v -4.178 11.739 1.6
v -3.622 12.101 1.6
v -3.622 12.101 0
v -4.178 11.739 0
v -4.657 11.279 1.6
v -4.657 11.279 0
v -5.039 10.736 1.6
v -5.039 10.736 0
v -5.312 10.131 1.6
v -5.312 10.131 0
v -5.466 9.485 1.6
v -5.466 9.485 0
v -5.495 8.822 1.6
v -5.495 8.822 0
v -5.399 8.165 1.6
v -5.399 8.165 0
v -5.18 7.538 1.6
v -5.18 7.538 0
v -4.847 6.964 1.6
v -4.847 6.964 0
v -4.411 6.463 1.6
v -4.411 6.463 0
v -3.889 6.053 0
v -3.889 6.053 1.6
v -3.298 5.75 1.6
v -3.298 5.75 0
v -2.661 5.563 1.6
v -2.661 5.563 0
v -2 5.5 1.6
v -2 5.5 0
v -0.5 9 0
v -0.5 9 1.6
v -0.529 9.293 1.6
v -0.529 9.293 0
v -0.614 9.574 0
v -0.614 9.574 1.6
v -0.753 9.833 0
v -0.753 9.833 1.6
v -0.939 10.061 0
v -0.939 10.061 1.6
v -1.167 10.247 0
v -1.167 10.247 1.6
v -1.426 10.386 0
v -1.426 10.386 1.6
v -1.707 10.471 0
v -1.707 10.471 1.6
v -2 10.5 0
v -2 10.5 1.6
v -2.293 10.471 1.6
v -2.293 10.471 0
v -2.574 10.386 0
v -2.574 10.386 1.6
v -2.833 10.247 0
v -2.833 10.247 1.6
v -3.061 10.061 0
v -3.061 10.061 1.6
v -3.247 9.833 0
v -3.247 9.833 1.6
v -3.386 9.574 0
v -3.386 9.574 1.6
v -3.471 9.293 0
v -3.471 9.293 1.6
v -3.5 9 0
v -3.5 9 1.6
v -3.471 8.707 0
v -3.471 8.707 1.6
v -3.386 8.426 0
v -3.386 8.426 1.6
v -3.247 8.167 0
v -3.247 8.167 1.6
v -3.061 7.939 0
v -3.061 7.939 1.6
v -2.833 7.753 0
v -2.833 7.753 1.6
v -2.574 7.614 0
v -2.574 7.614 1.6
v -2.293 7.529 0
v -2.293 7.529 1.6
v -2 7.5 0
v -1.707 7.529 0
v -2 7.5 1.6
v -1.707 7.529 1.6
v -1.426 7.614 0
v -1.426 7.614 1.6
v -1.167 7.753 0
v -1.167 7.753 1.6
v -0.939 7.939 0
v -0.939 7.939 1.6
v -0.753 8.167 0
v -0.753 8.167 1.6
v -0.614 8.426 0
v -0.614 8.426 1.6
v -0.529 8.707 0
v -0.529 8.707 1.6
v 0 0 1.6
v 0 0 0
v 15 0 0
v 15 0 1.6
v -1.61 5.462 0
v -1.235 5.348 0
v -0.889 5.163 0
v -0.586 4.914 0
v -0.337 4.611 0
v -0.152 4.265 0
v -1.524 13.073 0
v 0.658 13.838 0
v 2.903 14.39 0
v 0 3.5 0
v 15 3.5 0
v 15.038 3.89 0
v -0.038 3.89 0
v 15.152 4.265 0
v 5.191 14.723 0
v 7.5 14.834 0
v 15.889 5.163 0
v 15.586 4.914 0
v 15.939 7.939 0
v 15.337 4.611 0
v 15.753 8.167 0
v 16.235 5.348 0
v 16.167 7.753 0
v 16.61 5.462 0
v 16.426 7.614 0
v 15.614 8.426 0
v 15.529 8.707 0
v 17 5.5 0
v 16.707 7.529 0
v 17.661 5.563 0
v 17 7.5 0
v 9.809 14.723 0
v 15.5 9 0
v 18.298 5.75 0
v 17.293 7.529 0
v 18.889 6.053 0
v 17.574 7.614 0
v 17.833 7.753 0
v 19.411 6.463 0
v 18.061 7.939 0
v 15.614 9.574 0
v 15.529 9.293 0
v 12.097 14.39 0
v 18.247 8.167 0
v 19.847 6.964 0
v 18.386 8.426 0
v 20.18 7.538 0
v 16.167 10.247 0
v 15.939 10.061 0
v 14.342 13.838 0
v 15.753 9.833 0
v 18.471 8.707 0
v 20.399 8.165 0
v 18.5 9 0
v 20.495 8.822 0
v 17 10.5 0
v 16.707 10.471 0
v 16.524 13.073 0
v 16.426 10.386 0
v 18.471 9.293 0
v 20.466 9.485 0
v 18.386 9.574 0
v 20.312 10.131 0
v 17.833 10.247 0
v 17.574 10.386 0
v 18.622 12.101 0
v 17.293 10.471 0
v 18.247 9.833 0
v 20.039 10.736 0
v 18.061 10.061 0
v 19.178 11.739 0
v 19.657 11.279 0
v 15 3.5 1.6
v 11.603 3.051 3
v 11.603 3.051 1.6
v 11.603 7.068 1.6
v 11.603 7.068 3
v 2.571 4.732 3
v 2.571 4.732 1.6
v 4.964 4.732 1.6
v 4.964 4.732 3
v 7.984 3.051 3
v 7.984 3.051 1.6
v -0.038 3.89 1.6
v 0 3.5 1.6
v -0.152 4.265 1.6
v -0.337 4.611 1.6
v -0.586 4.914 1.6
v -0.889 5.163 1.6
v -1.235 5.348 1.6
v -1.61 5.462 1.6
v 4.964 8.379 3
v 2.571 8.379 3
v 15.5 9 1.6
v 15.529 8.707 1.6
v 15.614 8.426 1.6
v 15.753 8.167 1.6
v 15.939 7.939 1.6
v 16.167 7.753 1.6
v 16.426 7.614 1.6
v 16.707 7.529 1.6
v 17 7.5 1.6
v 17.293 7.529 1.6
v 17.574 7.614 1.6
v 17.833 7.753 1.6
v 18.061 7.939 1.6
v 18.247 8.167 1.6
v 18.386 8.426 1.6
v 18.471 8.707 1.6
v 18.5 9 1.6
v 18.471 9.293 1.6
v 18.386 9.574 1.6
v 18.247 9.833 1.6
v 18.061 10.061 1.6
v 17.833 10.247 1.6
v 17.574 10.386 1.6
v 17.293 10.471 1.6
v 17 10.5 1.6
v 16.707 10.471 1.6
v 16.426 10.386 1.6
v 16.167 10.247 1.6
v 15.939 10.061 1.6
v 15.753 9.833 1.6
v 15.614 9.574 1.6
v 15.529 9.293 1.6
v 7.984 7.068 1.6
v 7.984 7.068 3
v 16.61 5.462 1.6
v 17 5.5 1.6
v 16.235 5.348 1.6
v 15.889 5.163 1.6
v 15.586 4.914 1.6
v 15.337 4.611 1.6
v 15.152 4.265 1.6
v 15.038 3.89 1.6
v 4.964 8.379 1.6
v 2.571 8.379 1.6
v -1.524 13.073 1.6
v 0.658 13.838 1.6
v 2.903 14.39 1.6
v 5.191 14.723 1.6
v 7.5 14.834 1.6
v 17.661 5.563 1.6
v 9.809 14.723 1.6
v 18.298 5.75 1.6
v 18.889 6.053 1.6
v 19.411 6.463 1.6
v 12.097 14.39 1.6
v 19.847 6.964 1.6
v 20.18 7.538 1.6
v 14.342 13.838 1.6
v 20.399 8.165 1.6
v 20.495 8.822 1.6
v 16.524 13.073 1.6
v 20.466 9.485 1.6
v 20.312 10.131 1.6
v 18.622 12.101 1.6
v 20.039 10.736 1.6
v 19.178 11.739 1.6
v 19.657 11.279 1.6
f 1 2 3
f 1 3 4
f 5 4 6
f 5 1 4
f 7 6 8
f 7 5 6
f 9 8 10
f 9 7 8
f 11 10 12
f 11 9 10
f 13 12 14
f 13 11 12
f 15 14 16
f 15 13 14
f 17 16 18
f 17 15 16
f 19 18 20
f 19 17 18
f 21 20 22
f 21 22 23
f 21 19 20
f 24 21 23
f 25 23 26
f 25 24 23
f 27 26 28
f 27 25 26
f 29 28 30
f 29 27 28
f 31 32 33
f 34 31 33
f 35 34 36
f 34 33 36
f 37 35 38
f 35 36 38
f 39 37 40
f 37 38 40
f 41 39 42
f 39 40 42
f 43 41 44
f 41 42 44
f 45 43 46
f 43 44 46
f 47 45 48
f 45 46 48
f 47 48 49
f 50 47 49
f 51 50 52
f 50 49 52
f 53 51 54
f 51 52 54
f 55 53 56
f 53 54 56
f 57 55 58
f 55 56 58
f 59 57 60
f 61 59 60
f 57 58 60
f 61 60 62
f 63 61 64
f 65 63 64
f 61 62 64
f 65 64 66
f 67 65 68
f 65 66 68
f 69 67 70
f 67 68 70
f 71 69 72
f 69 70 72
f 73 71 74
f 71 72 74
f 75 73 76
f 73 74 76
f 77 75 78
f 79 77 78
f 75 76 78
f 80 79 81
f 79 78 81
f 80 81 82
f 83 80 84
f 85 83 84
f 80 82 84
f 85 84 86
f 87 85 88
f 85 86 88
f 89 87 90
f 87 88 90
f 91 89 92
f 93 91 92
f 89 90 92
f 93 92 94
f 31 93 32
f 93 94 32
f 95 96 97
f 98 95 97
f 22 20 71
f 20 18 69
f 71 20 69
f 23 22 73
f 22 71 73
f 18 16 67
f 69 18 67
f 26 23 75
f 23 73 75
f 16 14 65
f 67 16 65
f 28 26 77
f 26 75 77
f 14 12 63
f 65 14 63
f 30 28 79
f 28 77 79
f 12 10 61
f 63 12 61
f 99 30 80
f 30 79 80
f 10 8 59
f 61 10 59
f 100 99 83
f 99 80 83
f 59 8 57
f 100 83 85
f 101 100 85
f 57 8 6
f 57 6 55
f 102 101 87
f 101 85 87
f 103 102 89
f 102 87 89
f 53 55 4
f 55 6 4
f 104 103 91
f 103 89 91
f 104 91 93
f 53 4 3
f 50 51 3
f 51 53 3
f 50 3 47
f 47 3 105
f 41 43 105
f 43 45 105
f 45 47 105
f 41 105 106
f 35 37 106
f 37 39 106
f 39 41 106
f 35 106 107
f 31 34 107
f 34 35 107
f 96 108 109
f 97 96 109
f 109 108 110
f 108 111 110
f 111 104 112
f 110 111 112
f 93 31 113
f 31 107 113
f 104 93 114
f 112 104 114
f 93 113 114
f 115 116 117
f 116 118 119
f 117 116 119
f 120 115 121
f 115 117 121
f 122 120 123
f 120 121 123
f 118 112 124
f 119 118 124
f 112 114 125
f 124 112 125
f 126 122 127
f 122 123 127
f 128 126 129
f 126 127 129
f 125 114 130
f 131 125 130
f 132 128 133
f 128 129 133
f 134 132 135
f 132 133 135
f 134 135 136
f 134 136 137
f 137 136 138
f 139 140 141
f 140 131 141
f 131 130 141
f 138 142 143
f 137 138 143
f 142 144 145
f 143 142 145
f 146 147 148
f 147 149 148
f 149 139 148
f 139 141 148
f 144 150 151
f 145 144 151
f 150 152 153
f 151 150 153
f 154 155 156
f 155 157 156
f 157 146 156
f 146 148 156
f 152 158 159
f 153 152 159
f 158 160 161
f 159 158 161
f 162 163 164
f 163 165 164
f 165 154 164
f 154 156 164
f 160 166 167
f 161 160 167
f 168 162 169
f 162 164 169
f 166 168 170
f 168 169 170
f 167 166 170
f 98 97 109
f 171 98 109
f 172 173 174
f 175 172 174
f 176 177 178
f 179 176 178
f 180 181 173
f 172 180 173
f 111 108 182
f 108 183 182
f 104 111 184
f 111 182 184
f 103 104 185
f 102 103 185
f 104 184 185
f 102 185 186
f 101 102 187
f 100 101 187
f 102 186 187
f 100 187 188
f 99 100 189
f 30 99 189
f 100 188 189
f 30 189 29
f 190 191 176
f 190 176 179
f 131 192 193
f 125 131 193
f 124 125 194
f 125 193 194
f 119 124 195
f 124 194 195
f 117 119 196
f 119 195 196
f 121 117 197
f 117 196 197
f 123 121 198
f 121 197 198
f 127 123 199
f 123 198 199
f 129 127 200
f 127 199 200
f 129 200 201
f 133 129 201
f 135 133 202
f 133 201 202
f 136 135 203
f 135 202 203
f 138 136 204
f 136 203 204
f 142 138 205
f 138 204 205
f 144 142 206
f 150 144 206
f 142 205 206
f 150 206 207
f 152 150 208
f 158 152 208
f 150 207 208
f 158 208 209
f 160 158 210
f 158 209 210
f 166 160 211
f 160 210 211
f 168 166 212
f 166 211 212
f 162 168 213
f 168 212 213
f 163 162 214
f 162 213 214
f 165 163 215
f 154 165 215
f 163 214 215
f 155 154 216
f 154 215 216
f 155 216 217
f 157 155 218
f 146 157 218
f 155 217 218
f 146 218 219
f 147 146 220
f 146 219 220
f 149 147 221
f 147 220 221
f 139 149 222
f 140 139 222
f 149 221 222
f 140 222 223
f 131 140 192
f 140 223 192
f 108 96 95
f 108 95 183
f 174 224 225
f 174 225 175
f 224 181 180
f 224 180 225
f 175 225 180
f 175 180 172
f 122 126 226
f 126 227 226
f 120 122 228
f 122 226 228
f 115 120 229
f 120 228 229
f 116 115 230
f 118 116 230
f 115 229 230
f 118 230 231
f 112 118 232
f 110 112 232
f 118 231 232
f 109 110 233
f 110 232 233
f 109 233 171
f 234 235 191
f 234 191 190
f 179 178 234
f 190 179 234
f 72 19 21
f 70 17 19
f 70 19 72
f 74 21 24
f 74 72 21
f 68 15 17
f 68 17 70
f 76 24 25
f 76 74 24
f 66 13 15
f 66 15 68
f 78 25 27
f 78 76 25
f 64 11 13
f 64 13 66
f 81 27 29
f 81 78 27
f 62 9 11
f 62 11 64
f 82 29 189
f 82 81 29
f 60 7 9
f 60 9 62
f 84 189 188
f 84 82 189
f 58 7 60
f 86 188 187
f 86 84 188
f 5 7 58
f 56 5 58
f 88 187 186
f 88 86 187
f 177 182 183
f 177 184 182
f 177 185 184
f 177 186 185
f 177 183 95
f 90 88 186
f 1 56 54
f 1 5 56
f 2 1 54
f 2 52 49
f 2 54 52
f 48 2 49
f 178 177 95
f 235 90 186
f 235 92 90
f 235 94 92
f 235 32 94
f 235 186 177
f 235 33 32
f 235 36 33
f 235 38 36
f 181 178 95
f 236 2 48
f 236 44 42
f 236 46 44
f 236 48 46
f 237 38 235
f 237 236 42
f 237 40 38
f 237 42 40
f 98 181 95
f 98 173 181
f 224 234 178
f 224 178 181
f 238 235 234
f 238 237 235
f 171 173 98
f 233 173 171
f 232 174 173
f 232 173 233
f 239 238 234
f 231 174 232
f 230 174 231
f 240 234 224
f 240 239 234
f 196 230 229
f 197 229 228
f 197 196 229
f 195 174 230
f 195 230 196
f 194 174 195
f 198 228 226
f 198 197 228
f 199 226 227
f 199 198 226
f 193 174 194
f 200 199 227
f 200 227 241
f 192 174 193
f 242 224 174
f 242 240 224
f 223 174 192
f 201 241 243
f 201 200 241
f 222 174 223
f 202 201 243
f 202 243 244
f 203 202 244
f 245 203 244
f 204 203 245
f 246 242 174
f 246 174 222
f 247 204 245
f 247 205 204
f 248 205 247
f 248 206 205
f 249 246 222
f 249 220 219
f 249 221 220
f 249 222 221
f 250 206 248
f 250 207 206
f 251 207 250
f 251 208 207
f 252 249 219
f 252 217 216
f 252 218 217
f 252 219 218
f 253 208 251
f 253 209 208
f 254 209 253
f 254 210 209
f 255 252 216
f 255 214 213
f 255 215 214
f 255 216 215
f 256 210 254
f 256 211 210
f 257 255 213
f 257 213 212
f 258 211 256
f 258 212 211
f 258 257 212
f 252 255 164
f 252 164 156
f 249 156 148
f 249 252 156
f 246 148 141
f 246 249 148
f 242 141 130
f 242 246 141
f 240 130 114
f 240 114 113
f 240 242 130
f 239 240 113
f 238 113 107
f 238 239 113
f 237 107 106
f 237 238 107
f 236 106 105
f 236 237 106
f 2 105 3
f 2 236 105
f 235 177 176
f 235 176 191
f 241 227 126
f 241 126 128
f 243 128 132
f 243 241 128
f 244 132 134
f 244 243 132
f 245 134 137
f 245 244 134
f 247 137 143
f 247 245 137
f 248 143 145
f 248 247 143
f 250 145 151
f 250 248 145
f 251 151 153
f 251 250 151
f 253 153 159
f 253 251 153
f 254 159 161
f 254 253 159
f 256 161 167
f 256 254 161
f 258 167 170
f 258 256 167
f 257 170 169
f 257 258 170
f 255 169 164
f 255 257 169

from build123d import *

# Parameters (mm, degrees)
SKETCH_1_W      = 15
SKETCH_1_H      = 13
EXTRUDE_1_DEPTH = 1.6
SKETCH_2_R      = 3.5
SKETCH_2_R_2    = 1.5
EXTRUDE_2_DEPTH = 1.6
FILLET_1_R      = 2
SKETCH_3_W      = 3.618558991
SKETCH_3_H      = 4.017455257
SKETCH_3_W_2    = 2.3933776
SKETCH_3_H_2    = 3.647051581
EXTRUDE_3_DEPTH = 1.4
EXTRUDE_4_DEPTH = 1.6


with BuildPart() as part:
    # Эскиз1 → Бобышка-Вытянуть1 (new body)
    with BuildSketch(Plane.XY):
        with Locations((7.5, 6.5)):
            Rectangle(SKETCH_1_W, SKETCH_1_H)
    extrude(amount=EXTRUDE_1_DEPTH)

    # Эскиз2 → Бобышка-Вытянуть2 (add)
    # profile 1 of 2: a face of its own
    with BuildSketch(Plane.XY.offset(1.6)):
        with Locations((-2, 9)):
            Circle(SKETCH_2_R)
        with Locations((-2, 9)):
            Circle(SKETCH_2_R_2, mode=Mode.SUBTRACT)
    # profile 2 of 2: a face of its own
    with BuildSketch(Plane.XY.offset(1.6)):
        with Locations((17, 9)):
            Circle(SKETCH_2_R)
        with Locations(Location((17, 9, 0), (0, 0, 180))):
            Circle(SKETCH_2_R_2, mode=Mode.SUBTRACT)
    extrude(amount=-EXTRUDE_2_DEPTH)

    # Скругление1
    fillet_1_edges = [part.edges().sort_by_distance(p)[0] for p in [
        (0, 6.127718677, 0.8),
        (15, 6.127718677, 0.8),
    ]]
    fillet(fillet_1_edges, radius=FILLET_1_R)

    # Эскиз3 → Бобышка-Вытянуть3 (add)
    with BuildSketch(Plane.XY.offset(1.6)):
        with Locations((9.793653534, 5.059744515)):
            Rectangle(SKETCH_3_W, SKETCH_3_H)
        with Locations((3.767470648, 6.555605515)):
            Rectangle(SKETCH_3_W_2, SKETCH_3_H_2)
    extrude(amount=EXTRUDE_3_DEPTH)

    # Эскиз4 → Бобышка-Вытянуть4 (add)
    with BuildSketch(Plane.XY.offset(1.6)):
        with BuildLine():
            Line((-3.62195122, 12.101495485), (7.5, 9.632875059))
            Line((7.5, 9.632875059), (18.62195122, 12.101495485))
            ThreePointArc((18.62195122, 12.101495485), (7.5, 14.834097875), (-3.62195122, 12.101495485))
        make_face()
    extrude(amount=-EXTRUDE_4_DEPTH)


solid = part.part
